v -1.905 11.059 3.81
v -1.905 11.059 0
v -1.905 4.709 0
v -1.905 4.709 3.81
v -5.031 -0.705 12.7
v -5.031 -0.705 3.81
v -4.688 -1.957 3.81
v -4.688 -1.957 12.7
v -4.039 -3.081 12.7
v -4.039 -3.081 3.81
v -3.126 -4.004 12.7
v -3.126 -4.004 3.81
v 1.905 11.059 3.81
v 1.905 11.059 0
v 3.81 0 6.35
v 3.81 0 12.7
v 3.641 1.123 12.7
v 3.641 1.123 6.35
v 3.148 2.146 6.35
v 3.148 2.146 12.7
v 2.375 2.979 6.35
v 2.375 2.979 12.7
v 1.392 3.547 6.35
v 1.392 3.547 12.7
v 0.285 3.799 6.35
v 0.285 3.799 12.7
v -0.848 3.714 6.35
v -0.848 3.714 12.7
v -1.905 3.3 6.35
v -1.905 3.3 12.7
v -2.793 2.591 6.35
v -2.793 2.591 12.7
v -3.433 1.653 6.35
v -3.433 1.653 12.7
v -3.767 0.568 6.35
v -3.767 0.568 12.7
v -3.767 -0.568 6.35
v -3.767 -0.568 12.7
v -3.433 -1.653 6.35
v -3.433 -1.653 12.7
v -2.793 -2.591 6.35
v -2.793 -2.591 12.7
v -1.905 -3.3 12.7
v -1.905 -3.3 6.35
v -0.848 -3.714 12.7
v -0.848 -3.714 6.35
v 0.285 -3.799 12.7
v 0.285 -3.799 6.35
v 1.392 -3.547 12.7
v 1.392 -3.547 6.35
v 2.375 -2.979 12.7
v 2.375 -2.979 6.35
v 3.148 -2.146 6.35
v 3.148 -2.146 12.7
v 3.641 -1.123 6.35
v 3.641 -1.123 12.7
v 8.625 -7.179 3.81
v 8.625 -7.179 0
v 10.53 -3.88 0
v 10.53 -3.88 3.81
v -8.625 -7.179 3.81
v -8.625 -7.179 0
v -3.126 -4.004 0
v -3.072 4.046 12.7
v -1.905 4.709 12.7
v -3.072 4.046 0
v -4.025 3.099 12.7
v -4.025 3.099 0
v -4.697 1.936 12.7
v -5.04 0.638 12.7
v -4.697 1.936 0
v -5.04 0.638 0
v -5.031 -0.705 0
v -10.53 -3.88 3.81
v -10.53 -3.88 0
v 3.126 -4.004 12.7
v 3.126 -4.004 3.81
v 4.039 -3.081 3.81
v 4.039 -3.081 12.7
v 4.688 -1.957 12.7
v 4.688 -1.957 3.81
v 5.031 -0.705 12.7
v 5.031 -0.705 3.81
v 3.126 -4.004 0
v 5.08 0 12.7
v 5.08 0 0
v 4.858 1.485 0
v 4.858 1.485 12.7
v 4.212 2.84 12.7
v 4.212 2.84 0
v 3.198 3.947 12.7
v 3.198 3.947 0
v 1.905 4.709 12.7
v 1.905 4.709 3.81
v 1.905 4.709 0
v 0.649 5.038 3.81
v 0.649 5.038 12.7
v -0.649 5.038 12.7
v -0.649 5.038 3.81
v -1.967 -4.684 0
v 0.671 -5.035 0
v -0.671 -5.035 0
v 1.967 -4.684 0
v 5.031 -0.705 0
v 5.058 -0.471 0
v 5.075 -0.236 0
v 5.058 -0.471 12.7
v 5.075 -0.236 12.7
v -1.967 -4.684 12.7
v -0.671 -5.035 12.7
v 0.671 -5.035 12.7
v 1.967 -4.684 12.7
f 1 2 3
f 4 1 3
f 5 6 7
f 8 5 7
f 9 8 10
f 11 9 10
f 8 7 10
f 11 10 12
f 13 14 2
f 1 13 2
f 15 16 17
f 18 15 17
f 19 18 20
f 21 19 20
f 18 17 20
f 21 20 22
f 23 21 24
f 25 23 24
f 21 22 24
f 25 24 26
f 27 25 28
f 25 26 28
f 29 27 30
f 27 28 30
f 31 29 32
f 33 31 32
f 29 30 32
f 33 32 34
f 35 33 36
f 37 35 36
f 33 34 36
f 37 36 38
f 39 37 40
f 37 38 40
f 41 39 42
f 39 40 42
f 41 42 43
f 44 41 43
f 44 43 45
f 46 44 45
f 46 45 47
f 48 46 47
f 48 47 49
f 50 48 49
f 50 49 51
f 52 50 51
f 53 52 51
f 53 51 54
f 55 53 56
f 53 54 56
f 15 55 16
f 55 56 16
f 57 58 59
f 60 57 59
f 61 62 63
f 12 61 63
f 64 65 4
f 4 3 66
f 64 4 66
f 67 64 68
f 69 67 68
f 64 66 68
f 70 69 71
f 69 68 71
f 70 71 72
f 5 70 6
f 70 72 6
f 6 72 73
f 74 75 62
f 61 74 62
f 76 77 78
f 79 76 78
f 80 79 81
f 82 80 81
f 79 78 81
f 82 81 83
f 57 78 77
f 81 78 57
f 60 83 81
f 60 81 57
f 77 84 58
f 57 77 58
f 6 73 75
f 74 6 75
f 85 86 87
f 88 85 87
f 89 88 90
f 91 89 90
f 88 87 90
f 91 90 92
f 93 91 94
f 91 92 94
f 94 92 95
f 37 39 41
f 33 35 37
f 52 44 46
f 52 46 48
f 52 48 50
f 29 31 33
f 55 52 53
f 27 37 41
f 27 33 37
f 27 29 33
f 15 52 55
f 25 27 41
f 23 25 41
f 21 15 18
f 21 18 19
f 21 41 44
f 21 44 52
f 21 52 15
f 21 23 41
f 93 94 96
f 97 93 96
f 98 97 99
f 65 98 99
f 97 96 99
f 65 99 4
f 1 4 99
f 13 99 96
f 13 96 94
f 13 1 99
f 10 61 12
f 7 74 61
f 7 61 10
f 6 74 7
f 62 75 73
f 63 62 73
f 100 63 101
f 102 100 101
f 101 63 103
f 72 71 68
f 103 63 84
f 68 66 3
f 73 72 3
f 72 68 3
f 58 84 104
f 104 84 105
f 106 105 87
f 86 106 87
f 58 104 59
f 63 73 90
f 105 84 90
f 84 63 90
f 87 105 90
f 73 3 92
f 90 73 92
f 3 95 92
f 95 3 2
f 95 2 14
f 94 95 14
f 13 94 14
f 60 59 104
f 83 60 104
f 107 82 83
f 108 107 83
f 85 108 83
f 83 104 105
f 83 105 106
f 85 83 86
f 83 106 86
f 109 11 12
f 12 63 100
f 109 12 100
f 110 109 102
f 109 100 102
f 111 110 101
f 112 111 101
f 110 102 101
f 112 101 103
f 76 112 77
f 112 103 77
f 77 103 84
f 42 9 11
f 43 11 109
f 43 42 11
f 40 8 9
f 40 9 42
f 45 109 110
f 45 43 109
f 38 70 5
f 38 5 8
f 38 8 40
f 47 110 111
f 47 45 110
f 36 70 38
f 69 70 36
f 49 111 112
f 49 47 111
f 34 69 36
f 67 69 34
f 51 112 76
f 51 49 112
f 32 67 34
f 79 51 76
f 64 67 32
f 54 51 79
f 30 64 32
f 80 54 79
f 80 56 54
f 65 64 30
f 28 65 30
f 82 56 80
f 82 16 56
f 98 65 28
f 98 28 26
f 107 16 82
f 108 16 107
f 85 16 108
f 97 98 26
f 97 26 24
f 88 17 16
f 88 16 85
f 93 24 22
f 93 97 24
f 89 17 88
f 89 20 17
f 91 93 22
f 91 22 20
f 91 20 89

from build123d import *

# Parameters (mm, degrees)
F1_DEPTH = 12.7
F3_DEPTH = 3.81
F4_R     = 3.81
F5_DEPTH = 6.35


with BuildPart() as f1:
    # F0 (on Top) → F1 (new body)
    with BuildSketch(Plane.XY):
        with BuildLine():
            ThreePointArc((5.030861, -0.704865), (5.0677, -0.353288), (5.08, 0))
            ThreePointArc((5.08, 0), (4.212113, 2.839806), (1.905, 4.709286))
            ThreePointArc((1.905, 4.709286), (0, 5.08), (-1.905, 4.709286))
            ThreePointArc((-1.905, 4.709286), (-4.399409, 2.54), (-5.030861, -0.704865))
            ThreePointArc((-5.030861, -0.704865), (-4.399409, -2.54), (-3.125861, -4.004421))
            ThreePointArc((-3.125861, -4.004421), (0, -5.08), (3.125861, -4.004421))
            ThreePointArc((3.125861, -4.004421), (4.399409, -2.54), (5.030861, -0.704865))
        make_face()
    extrude(amount=F1_DEPTH)

    # F2 (on Top) → F3 (join)
    with BuildSketch(Plane.XY):
        with BuildLine():
            Line((10.530123, -3.879865), (5.030861, -0.704865))
            ThreePointArc((5.030861, -0.704865), (4.399409, -2.54), (3.125861, -4.004421))
            Line((3.125861, -4.004421), (8.625123, -7.179421))
            Line((8.625123, -7.179421), (10.530123, -3.879865))
        make_face()
        with BuildLine():
            ThreePointArc((-1.905, 4.709286), (0, 5.08), (1.905, 4.709286))
            Line((1.905, 4.709286), (1.905, 11.059286))
            Line((1.905, 11.059286), (-1.905, 11.059286))
            Line((-1.905, 11.059286), (-1.905, 4.709286))
        make_face()
        with BuildLine():
            ThreePointArc((-3.125861, -4.004421), (-4.399409, -2.54), (-5.030861, -0.704865))
            Line((-5.030861, -0.704865), (-10.530123, -3.879865))
            Line((-10.530123, -3.879865), (-8.625123, -7.179421))
            Line((-8.625123, -7.179421), (-3.125861, -4.004421))
        make_face()
    extrude(amount=F3_DEPTH)

    # F4 (on face) → F5 (cut)
    with BuildSketch(Plane.XY.offset(12.7)):
        Circle(F4_R)
    extrude(amount=-F5_DEPTH, mode=Mode.SUBTRACT)


solid = f1.part
